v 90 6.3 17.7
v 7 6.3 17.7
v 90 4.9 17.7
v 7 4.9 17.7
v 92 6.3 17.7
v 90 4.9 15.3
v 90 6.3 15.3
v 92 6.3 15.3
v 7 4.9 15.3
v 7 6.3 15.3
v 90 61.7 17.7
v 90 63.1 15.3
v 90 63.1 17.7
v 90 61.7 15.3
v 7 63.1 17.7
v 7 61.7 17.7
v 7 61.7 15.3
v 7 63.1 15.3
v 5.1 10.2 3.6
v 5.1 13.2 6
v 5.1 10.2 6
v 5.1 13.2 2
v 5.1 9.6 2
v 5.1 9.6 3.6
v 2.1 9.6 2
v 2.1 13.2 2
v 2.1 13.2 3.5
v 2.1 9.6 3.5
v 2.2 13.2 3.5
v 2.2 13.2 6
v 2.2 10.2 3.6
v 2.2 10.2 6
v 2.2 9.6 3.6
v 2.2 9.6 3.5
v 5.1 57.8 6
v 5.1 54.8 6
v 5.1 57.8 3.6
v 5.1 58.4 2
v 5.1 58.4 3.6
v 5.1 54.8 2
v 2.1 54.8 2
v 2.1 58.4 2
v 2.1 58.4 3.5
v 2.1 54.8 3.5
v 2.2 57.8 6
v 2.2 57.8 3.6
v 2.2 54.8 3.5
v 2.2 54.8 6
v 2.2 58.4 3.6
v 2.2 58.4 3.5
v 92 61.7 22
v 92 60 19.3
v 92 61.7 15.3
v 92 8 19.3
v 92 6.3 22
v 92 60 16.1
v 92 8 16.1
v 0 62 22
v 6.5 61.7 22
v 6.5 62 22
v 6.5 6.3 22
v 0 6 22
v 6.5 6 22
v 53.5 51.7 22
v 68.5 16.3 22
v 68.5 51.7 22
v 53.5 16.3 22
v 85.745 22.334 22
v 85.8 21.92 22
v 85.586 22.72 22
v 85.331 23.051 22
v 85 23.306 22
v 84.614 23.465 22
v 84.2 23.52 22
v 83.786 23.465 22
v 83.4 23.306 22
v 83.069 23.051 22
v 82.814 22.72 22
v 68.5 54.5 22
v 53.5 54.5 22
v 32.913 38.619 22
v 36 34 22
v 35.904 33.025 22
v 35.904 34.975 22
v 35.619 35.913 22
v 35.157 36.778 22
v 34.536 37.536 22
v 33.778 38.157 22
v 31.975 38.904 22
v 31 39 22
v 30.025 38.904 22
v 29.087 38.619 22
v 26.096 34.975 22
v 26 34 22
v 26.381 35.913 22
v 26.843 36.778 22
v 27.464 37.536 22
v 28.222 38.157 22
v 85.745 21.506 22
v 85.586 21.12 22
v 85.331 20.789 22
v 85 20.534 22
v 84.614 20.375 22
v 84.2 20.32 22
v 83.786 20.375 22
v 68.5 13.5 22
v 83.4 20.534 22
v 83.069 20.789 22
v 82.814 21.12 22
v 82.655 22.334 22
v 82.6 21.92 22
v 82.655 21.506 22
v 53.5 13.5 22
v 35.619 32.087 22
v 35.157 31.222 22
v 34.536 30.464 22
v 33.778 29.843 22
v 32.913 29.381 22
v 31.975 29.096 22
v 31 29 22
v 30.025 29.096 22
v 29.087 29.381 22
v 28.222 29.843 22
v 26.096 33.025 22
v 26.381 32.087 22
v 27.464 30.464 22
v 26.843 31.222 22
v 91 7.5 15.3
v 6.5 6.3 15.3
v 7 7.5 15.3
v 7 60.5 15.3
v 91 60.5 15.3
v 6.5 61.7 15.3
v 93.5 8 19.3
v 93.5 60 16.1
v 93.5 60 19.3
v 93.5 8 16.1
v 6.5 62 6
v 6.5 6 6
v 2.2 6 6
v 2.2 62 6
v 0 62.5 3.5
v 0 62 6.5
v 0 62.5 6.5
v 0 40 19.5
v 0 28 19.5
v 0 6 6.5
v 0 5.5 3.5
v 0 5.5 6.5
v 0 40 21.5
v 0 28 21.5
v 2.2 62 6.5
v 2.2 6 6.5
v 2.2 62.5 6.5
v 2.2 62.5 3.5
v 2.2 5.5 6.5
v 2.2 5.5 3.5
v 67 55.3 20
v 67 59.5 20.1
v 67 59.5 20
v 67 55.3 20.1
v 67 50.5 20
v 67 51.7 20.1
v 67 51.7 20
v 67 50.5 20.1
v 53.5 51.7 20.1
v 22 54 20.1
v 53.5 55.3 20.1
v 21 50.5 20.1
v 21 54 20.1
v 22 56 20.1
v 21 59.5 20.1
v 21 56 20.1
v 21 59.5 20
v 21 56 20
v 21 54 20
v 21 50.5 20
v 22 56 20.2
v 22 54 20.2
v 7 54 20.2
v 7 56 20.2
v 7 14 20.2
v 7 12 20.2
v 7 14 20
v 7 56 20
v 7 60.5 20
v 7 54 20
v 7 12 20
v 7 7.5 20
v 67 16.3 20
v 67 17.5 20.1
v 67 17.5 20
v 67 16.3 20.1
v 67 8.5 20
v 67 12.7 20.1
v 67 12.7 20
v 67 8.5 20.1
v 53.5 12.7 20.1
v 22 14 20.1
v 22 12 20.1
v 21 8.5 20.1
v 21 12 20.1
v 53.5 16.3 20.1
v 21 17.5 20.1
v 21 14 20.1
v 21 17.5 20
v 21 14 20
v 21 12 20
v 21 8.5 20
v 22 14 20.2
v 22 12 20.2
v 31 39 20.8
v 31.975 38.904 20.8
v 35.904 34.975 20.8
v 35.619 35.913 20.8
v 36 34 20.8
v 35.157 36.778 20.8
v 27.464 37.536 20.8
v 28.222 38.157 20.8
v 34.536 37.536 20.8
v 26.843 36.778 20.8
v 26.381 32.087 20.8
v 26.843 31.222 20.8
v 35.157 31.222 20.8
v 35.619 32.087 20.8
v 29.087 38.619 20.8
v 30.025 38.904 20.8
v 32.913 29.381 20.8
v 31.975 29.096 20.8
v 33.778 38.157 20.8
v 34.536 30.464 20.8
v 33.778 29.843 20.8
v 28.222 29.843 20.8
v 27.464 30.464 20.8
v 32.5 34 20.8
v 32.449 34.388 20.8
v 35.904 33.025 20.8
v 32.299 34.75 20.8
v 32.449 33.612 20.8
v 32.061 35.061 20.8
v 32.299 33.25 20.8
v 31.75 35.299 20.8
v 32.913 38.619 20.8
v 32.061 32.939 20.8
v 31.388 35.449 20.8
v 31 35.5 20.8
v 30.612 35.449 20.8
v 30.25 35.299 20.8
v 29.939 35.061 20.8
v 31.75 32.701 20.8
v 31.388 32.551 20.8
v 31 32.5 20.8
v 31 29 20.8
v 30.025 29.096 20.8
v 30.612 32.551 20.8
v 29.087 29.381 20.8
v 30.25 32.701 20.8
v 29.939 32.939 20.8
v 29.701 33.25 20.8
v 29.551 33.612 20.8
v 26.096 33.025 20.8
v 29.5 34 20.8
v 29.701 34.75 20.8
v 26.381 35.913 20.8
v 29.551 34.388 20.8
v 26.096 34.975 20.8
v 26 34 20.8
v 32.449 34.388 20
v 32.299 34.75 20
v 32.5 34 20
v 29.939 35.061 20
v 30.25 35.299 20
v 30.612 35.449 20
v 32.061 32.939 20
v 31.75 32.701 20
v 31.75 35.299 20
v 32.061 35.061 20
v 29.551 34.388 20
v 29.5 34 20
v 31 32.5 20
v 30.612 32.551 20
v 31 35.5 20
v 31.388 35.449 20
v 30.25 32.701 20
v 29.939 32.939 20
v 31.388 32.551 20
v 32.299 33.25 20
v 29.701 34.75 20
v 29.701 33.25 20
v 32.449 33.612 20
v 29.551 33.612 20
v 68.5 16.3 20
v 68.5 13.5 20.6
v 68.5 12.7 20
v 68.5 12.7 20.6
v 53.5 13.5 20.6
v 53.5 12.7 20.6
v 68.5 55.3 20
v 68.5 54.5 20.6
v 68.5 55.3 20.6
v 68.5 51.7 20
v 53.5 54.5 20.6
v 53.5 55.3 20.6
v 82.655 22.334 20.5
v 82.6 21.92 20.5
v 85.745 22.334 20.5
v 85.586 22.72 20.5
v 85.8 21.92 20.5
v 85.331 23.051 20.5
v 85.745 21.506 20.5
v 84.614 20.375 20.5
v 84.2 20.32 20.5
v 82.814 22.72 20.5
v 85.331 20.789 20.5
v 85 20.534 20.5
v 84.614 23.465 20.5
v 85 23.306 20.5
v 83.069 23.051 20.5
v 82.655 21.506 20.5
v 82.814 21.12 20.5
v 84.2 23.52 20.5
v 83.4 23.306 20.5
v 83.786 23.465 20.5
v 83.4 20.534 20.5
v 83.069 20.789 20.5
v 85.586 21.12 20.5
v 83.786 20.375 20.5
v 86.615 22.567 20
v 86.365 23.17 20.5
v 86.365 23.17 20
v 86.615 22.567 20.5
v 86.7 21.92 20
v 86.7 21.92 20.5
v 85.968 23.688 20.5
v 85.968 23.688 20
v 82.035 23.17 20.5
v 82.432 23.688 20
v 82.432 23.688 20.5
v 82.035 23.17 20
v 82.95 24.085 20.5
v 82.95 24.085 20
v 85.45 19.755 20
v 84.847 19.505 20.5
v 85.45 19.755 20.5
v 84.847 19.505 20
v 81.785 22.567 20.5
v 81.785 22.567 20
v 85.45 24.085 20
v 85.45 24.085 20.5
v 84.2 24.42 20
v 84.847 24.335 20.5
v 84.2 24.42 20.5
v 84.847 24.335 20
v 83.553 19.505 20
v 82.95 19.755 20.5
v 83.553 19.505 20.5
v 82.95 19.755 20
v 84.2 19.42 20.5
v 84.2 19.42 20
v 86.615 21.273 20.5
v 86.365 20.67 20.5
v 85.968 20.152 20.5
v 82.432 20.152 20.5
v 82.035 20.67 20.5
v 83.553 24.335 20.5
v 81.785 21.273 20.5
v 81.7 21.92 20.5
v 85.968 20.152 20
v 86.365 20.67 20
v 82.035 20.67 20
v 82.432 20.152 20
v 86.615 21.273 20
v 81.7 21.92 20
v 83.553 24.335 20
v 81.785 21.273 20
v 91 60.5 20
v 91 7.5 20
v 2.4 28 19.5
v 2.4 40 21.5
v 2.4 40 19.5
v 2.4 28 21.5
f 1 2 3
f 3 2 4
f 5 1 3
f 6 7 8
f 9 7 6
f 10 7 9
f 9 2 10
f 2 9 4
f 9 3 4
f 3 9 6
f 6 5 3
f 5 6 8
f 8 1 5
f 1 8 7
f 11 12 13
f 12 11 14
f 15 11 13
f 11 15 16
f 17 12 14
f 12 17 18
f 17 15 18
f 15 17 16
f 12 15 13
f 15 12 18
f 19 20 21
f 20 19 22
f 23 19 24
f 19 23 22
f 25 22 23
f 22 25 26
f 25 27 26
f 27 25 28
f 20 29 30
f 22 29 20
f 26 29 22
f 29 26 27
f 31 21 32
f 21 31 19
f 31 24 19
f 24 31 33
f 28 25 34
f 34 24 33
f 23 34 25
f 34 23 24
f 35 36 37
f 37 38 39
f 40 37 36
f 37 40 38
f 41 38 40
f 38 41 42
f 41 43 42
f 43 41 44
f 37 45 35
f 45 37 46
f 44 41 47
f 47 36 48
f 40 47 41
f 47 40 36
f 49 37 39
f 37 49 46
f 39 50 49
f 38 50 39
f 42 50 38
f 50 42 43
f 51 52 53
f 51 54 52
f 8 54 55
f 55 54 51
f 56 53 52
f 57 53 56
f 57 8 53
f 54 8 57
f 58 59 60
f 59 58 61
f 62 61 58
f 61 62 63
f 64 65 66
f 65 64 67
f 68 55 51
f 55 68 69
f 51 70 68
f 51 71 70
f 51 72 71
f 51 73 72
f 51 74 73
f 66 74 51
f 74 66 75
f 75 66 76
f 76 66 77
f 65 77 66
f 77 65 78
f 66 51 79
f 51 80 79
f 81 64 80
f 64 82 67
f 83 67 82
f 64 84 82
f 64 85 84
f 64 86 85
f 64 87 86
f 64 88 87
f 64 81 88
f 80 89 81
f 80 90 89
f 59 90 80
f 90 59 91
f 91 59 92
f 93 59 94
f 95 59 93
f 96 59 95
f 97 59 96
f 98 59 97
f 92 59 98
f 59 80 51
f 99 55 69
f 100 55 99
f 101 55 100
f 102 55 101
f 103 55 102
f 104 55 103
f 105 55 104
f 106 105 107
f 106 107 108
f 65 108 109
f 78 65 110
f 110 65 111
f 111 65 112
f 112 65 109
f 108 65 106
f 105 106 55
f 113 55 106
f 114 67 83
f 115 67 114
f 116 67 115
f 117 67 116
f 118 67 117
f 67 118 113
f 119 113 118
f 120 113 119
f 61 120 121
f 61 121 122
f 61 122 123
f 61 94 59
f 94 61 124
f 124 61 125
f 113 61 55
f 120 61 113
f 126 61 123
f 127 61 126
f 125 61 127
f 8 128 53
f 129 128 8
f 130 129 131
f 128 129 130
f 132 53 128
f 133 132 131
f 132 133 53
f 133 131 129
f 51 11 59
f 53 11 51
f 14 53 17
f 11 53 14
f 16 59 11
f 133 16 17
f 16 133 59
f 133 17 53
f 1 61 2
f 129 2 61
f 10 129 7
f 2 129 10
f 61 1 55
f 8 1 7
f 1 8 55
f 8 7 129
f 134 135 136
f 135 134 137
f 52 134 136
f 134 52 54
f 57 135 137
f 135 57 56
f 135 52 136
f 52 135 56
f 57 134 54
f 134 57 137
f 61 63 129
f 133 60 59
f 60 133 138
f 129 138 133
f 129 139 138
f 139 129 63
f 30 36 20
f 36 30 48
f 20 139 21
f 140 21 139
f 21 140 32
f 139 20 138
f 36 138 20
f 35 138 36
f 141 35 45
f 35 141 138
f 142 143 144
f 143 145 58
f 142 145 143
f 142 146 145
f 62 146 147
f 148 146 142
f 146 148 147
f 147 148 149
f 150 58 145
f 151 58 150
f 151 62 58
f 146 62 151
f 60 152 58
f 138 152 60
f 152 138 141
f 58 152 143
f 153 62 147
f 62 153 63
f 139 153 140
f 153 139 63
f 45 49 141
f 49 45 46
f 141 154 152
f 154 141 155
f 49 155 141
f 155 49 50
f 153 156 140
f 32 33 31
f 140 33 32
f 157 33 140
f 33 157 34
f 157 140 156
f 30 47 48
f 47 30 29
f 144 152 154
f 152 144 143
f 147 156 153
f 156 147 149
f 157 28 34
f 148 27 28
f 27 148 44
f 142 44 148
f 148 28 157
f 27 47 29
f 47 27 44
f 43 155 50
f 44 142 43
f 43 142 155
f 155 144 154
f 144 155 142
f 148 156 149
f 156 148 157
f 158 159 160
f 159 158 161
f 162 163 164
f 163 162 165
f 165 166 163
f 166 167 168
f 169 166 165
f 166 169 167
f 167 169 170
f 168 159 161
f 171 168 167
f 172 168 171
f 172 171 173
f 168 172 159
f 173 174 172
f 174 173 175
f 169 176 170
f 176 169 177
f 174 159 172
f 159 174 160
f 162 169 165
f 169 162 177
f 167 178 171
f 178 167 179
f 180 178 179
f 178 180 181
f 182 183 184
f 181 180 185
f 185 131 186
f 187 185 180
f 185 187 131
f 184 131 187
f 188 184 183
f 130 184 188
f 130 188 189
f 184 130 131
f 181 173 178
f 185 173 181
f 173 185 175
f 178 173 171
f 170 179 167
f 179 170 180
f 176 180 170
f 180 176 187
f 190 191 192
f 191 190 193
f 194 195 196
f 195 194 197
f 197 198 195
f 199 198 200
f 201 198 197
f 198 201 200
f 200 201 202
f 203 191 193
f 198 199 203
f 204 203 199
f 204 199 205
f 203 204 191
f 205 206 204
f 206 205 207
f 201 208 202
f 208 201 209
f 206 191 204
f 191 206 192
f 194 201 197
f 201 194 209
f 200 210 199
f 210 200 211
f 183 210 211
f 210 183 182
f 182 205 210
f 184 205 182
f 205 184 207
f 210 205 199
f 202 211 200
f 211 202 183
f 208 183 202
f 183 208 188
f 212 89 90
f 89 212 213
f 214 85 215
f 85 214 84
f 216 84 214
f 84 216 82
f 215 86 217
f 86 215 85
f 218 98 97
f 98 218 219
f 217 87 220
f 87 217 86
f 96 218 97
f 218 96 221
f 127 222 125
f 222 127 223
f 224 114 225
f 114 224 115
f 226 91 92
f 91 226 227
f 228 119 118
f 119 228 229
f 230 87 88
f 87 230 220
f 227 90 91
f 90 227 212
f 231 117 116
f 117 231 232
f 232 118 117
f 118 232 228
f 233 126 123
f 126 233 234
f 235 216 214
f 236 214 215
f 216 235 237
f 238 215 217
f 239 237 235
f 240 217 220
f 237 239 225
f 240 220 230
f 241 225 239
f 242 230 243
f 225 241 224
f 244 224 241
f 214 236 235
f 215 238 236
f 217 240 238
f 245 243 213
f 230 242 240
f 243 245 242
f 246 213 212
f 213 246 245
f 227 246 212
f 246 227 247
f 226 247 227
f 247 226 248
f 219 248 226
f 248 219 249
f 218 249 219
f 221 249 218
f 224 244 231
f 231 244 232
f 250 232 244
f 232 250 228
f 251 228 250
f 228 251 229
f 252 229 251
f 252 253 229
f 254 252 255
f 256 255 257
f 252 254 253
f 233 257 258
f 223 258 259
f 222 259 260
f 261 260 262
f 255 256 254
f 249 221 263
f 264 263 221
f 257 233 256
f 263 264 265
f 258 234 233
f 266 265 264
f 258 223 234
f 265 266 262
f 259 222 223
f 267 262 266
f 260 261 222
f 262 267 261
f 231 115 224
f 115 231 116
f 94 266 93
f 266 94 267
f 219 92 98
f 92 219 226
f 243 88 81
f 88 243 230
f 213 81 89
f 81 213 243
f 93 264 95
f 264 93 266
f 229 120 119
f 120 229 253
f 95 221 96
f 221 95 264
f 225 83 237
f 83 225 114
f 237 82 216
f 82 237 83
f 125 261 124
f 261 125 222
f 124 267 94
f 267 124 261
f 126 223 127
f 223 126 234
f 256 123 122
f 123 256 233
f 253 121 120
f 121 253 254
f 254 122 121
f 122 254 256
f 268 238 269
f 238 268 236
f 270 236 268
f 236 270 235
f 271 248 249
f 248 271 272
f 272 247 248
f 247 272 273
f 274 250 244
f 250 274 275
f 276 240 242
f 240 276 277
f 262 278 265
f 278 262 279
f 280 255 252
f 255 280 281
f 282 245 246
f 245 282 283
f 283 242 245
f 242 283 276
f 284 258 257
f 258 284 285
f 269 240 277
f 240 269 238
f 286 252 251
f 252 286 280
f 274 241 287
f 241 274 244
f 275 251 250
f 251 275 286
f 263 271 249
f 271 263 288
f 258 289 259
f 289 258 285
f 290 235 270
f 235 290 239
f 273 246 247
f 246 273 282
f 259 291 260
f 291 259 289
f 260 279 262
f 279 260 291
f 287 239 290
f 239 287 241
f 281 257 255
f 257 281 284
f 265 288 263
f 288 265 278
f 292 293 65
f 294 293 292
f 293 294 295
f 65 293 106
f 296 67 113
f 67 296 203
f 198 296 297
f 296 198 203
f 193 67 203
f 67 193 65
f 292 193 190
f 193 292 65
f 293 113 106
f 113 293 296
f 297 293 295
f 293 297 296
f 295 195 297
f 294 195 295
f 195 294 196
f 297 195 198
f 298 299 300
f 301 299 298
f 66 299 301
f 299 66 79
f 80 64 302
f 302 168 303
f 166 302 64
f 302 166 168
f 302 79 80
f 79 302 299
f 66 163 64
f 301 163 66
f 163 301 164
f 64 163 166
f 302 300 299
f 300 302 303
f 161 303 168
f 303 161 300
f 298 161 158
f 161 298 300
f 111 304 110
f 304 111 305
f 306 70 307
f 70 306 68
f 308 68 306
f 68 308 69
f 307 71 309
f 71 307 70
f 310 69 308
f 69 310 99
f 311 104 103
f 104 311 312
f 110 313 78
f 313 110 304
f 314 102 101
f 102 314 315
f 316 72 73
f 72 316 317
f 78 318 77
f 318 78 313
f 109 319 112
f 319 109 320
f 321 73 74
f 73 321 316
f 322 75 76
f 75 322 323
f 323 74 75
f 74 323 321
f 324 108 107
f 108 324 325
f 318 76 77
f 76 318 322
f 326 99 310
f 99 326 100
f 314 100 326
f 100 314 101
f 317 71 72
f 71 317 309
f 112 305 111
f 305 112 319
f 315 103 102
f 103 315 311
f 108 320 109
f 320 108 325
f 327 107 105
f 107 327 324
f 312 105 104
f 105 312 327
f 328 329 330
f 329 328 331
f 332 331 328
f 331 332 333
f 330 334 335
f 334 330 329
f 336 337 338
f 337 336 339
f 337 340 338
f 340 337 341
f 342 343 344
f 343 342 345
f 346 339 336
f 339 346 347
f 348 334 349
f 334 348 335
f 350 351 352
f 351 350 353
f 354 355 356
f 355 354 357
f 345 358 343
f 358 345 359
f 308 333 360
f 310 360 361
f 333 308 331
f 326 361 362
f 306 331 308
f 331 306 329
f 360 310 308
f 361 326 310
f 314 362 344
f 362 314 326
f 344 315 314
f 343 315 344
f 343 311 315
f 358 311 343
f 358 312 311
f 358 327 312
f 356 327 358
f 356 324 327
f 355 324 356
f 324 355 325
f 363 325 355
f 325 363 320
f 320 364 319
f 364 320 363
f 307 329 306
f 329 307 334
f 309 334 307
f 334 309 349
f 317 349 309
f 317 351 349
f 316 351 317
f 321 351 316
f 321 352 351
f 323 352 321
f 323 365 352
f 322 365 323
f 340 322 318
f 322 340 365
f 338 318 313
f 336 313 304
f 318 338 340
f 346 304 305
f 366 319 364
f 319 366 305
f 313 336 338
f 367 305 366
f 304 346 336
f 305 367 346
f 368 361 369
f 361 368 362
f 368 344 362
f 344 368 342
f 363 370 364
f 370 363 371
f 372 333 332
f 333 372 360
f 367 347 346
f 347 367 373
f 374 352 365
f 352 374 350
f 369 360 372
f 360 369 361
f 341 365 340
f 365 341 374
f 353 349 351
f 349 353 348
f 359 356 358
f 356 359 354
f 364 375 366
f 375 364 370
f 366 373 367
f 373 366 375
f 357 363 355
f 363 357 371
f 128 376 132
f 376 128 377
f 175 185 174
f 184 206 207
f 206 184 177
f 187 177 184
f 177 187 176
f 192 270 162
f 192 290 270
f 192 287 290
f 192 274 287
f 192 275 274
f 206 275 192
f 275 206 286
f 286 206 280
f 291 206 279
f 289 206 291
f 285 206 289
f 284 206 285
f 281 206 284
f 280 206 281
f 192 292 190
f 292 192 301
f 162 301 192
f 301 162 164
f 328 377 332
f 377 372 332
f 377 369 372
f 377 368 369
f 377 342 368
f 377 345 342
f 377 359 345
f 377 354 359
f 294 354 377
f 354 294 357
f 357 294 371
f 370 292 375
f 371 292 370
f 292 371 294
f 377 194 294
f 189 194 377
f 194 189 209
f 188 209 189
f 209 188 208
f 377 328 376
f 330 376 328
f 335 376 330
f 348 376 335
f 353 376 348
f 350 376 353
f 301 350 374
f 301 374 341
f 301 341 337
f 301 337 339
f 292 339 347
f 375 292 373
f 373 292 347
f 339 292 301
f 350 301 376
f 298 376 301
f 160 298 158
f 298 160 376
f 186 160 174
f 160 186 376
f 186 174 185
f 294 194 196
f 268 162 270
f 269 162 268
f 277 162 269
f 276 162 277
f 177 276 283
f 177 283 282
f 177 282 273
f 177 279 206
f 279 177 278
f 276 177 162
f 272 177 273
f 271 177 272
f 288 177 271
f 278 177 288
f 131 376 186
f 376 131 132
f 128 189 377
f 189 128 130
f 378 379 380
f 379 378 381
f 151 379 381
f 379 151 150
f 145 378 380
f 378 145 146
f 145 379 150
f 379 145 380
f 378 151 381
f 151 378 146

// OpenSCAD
// =============================================================================
// OpenMotorBridge - Universal Front Node: L-Slide Lid (v10.0 Monocoque)
// =============================================================================
// File: hardware/cad/scad/04_front_node/01_front_node_lid.scad
// Description: HP MJF PA12 waterproof slide lid (Schiebedeckel) utilizing the v10
//              Monocoque Slide-In Principle:
//              1. Lateral guide tongues engaging longitudinal C-grooves (Z = 16.5 mm).
//              2. Front wedge-lock nose (Keilanzug) seating into East wall undercut.
//              3. Monolithic vertical Heckwand (West end) with lower sill drip apron.
//              4. Dual deadbolt snap-latches engaging lower sill sockets.
//              5. Integrated Gore ePTFE pressure compensation membrane seat.
//              6. Top docking interface (snap slots) for environmental Sensor Puck.
//              7. Status LED optical light-pipe aperture over LED1.
//              8. Universal Dual-Antenna Cradles for ESP32-E22 (2x2 MIMO 5/6 GHz):
//                 - Recessed adhesive nests for 2x Flex PCB dipoles (Taoglas FXP73 / Molex)
//                 - Snap-in C-clips for 2x internal omnidirectional stub antennas (Ø 6.5 mm)
//                 - Strain-relief coaxial wire routing channels to ANT1 & ANT2.
// =============================================================================

include <../00_common/parameters.scad>;

module front_node_upper_lid() {
    ch_x_start   = FRONT_NODE_WALL + 3.5; // 6.0 mm
    ch_y_start   = FRONT_NODE_WALL + 3.5; // 6.0 mm
    rail_z       = FRONT_NODE_RAIL_Z;     // 16.5 mm
    rail_h       = 2.4;                   // Tongue height (clearance inside 2.8 mm C-groove)
    tongue_prot  = 1.4;                   // Tongue protrusion into C-groove
    lid_top_z    = FRONT_NODE_OUTER_H;    // 22.0 mm
    lid_th       = lid_top_z - (rail_z - rail_h/2.0); // ~6.7 mm

    color([0.22, 0.24, 0.26]) {
        difference() {
            union() {
                // 1. Horizontal Slide Lid Main Plate
                // Fits inside tub chamber (Y = ch_y_start + 0.3 .. ch_y_start + FRONT_NODE_CHAMBER_W - 0.3)
                translate([ch_x_start - 0.5, ch_y_start + 0.3, rail_z - rail_h/2.0]) {
                    cube([
                        FRONT_NODE_CHAMBER_L + 0.5,
                        FRONT_NODE_CHAMBER_W - 0.6,
                        lid_th
                    ], center=false);
                }

                // 2. South Lateral Guide Tongue (engages South C-Groove)
                translate([ch_x_start + 1.0, ch_y_start - tongue_prot + 0.3, rail_z - rail_h/2.0]) {
                    cube([FRONT_NODE_CHAMBER_L - 3.0, tongue_prot + 0.2, rail_h], center=false);
                    // 45° Lead-in chamfer at front (East) tip
                    translate([FRONT_NODE_CHAMBER_L - 3.0, 0, 0])
                        linear_extrude(height=rail_h)
                            polygon(points=[[0, 0], [2.0, tongue_prot], [0, tongue_prot]]);
                }

                // 3. North Lateral Guide Tongue (engages North C-Groove)
                translate([ch_x_start + 1.0, ch_y_start + FRONT_NODE_CHAMBER_W - 0.5, rail_z - rail_h/2.0]) {
                    cube([FRONT_NODE_CHAMBER_L - 3.0, tongue_prot + 0.2, rail_h], center=false);
                    // 45° Lead-in chamfer at front (East) tip
                    translate([FRONT_NODE_CHAMBER_L - 3.0, 0, 0])
                        linear_extrude(height=rail_h)
                            polygon(points=[[0, 0], [0, -tongue_prot], [2.0, -tongue_prot]]);
                }

                // 4. Front Wedge-Lock Nose (Keilanzug into East wall undercut)
                translate([ch_x_start + FRONT_NODE_CHAMBER_L - 0.1, ch_y_start + 2.0, rail_z - 0.4]) {
                    cube([1.6, FRONT_NODE_CHAMBER_W - 4.0, rail_h + 0.8], center=false);
                }

                // 5. Monolithic Rear Vertical Heckwand (West end: X = 0..6.0 mm, Z = 6.0..22.0 mm)
                translate([0, ch_y_start, FRONT_NODE_REAR_SILL_H]) {
                    cube([ch_x_start + 0.5, FRONT_NODE_CHAMBER_W, lid_top_z - FRONT_NODE_REAR_SILL_H], center=false);
                }

                // Drip Apron (Tropfnase) overlapping lower sill down to Z = 3.5 mm
                translate([0, ch_y_start - 0.5, 3.5]) {
                    cube([2.2, FRONT_NODE_CHAMBER_W + 1.0, FRONT_NODE_REAR_SILL_H - 3.5 + 0.5], center=false);
                }

                // 6. Dual Slam-to-Shut Deadbolt Locking Legs (West corners into sill sockets)
                // Left locking leg
                translate([2.1, ch_y_start + 4.2, 2.0]) {
                    cube([3.0, 3.0, FRONT_NODE_REAR_SILL_H - 2.0 + 1.0], center=false);
                    // Snap catch barb
                    translate([0, -0.6, 0])
                        cube([3.0, 0.8, 1.6], center=false);
                }
                // Right locking leg
                translate([2.1, ch_y_start + FRONT_NODE_CHAMBER_W - 7.2, 2.0]) {
                    cube([3.0, 3.0, FRONT_NODE_REAR_SILL_H - 2.0 + 1.0], center=false);
                    // Snap catch barb
                    translate([0, 2.8, 0])
                        cube([3.0, 0.8, 1.6], center=false);
                }

                // 7. Internal Antenna Snap-In C-Clips (for optional internal stub antennas Ø 6.5 mm)
                // North Stub Antenna C-Clips (Bay 1)
                for (cx = [25.0, 55.0]) {
                    translate([ch_x_start + cx, ch_y_start + FRONT_NODE_CHAMBER_W - 6.5, rail_z - rail_h/2.0]) {
                        difference() {
                            cylinder(r=4.2, h=3.0, $fn=24);
                            translate([0, 0, -0.1])
                                cylinder(r=3.25, h=3.2, $fn=24); // Ø 6.5 mm bore
                            translate([-5.0, 0, -0.1])
                                cube([10.0, 5.0, 3.5], center=false); // snap entry opening
                        }
                    }
                }
                // South / Transverse Stub Antenna C-Clips (Bay 2)
                for (cx = [25.0, 55.0]) {
                    translate([ch_x_start + cx, ch_y_start + 6.5, rail_z - rail_h/2.0]) {
                        difference() {
                            cylinder(r=4.2, h=3.0, $fn=24);
                            translate([0, 0, -0.1])
                                cylinder(r=3.25, h=3.2, $fn=24); // Ø 6.5 mm bore
                            translate([-5.0, -5.0, -0.1])
                                cube([10.0, 5.0, 3.5], center=false); // snap entry opening
                        }
                    }
                }
            }

            // --- SUBTRACTIONS (Lid Cavities & Interfaces) ---

            // 8. Internal Weight & Clearance Hollow (Z = rail_z - rail_h/2.0 .. lid_top_z - 2.0 mm)
            translate([ch_x_start + 1.0, ch_y_start + 1.5, rail_z - rail_h/2.0 - 0.1]) {
                cube([FRONT_NODE_CHAMBER_L - 2.0, FRONT_NODE_CHAMBER_W - 3.0, lid_th - 2.0 + 0.1], center=false);
            }

            // 9. Universal Wi-Fi 6E Antenna Pockets (Taoglas FXP73 / Molex Flex PCB Dipoles 46 x 9 mm)
            // Bay 1: Longitudinal Flex Antenna Nest (North zone)
            translate([ch_x_start + 15.0, ch_y_start + FRONT_NODE_CHAMBER_W - 11.5, lid_top_z - 2.0 - 0.7]) {
                cube([46.0, 9.0, 0.8], center=false);
                // U.FL Coaxial routing channel leading towards West / North-West (ANT1)
                translate([-14.0, 3.5, -0.5])
                    cube([15.0, 2.0, 1.4], center=false);
            }

            // Bay 2: Longitudinal Flex Antenna Nest (South zone - 90° spatial diversity)
            translate([ch_x_start + 15.0, ch_y_start + 2.5, lid_top_z - 2.0 - 0.7]) {
                cube([46.0, 9.0, 0.8], center=false);
                // U.FL Coaxial routing channel leading towards West / South-West (ANT2)
                translate([-14.0, 3.5, -0.5])
                    cube([15.0, 2.0, 1.4], center=false);
            }

            // 10. Gore ePTFE Breather Vent Seat (Center-West of lid)
            translate([ch_x_start + 25.0, ch_y_start + FRONT_NODE_CHAMBER_W / 2.0, lid_top_z - 1.2]) {
                // Circular membrane nest Ø 10.0 mm x 1.2 mm
                cylinder(r=5.0, h=1.5, center=false, $fn=32);
                // Central through-vent bore Ø 3.0 mm
                translate([0, 0, -4.0])
                    cylinder(r=1.5, h=5.0, center=false, $fn=24);
            }

            // 11. Modular Sensor Puck Docking Interface (Snap Slots matching sensor_puck_environmental)
            // Sensor Puck footprint is 38 x 38 mm, centered at X = ch_x_start + 55 mm, Y = ch_y_start + 28 mm
            // Slot 1 (South catch): Y offset -19.0 mm
            translate([ch_x_start + 55.0 - 7.5, ch_y_start + 28.0 - 19.0 - 1.5, lid_top_z - 3.2]) {
                cube([15.0, 2.8, 3.5], center=false);
                // Catch barb undercut
                translate([0, -0.8, 0])
                    cube([15.0, 1.2, 1.8], center=false);
            }
            // Slot 2 (North catch): Y offset +19.0 mm
            translate([ch_x_start + 55.0 - 7.5, ch_y_start + 28.0 + 19.0 - 1.3, lid_top_z - 3.2]) {
                cube([15.0, 2.8, 3.5], center=false);
                // Catch barb undercut
                translate([0, 2.4, 0])
                    cube([15.0, 1.2, 1.8], center=false);
            }

            // 12. Status LED Light-Pipe Aperture (Ø 3.0 mm over LED1 at East side)
            // KiCad LED1 is at relative X=80.20 mm, Y=37.08 mm
            translate([ch_x_start + 2.0 + 80.20 - 4.0, ch_y_start + 3.0 + (50.0 - 37.08), lid_top_z - 3.0]) {
                cylinder(r=1.6, h=4.0, center=false, $fn=24);
                // Counterbore dome for light diffuser
                cylinder(r=2.5, h=1.5, center=false, $fn=24);
            }

            // 13. Service Release Pry Slot on Rear Heckwand (West face at X = 0)
            translate([-0.1, ch_y_start + FRONT_NODE_CHAMBER_W / 2.0 - 6.0, lid_top_z - 2.5]) {
                cube([2.5, 12.0, 2.0], center=false);
            }
        }
    }
}

// Standalone compilation
front_node_upper_lid();
